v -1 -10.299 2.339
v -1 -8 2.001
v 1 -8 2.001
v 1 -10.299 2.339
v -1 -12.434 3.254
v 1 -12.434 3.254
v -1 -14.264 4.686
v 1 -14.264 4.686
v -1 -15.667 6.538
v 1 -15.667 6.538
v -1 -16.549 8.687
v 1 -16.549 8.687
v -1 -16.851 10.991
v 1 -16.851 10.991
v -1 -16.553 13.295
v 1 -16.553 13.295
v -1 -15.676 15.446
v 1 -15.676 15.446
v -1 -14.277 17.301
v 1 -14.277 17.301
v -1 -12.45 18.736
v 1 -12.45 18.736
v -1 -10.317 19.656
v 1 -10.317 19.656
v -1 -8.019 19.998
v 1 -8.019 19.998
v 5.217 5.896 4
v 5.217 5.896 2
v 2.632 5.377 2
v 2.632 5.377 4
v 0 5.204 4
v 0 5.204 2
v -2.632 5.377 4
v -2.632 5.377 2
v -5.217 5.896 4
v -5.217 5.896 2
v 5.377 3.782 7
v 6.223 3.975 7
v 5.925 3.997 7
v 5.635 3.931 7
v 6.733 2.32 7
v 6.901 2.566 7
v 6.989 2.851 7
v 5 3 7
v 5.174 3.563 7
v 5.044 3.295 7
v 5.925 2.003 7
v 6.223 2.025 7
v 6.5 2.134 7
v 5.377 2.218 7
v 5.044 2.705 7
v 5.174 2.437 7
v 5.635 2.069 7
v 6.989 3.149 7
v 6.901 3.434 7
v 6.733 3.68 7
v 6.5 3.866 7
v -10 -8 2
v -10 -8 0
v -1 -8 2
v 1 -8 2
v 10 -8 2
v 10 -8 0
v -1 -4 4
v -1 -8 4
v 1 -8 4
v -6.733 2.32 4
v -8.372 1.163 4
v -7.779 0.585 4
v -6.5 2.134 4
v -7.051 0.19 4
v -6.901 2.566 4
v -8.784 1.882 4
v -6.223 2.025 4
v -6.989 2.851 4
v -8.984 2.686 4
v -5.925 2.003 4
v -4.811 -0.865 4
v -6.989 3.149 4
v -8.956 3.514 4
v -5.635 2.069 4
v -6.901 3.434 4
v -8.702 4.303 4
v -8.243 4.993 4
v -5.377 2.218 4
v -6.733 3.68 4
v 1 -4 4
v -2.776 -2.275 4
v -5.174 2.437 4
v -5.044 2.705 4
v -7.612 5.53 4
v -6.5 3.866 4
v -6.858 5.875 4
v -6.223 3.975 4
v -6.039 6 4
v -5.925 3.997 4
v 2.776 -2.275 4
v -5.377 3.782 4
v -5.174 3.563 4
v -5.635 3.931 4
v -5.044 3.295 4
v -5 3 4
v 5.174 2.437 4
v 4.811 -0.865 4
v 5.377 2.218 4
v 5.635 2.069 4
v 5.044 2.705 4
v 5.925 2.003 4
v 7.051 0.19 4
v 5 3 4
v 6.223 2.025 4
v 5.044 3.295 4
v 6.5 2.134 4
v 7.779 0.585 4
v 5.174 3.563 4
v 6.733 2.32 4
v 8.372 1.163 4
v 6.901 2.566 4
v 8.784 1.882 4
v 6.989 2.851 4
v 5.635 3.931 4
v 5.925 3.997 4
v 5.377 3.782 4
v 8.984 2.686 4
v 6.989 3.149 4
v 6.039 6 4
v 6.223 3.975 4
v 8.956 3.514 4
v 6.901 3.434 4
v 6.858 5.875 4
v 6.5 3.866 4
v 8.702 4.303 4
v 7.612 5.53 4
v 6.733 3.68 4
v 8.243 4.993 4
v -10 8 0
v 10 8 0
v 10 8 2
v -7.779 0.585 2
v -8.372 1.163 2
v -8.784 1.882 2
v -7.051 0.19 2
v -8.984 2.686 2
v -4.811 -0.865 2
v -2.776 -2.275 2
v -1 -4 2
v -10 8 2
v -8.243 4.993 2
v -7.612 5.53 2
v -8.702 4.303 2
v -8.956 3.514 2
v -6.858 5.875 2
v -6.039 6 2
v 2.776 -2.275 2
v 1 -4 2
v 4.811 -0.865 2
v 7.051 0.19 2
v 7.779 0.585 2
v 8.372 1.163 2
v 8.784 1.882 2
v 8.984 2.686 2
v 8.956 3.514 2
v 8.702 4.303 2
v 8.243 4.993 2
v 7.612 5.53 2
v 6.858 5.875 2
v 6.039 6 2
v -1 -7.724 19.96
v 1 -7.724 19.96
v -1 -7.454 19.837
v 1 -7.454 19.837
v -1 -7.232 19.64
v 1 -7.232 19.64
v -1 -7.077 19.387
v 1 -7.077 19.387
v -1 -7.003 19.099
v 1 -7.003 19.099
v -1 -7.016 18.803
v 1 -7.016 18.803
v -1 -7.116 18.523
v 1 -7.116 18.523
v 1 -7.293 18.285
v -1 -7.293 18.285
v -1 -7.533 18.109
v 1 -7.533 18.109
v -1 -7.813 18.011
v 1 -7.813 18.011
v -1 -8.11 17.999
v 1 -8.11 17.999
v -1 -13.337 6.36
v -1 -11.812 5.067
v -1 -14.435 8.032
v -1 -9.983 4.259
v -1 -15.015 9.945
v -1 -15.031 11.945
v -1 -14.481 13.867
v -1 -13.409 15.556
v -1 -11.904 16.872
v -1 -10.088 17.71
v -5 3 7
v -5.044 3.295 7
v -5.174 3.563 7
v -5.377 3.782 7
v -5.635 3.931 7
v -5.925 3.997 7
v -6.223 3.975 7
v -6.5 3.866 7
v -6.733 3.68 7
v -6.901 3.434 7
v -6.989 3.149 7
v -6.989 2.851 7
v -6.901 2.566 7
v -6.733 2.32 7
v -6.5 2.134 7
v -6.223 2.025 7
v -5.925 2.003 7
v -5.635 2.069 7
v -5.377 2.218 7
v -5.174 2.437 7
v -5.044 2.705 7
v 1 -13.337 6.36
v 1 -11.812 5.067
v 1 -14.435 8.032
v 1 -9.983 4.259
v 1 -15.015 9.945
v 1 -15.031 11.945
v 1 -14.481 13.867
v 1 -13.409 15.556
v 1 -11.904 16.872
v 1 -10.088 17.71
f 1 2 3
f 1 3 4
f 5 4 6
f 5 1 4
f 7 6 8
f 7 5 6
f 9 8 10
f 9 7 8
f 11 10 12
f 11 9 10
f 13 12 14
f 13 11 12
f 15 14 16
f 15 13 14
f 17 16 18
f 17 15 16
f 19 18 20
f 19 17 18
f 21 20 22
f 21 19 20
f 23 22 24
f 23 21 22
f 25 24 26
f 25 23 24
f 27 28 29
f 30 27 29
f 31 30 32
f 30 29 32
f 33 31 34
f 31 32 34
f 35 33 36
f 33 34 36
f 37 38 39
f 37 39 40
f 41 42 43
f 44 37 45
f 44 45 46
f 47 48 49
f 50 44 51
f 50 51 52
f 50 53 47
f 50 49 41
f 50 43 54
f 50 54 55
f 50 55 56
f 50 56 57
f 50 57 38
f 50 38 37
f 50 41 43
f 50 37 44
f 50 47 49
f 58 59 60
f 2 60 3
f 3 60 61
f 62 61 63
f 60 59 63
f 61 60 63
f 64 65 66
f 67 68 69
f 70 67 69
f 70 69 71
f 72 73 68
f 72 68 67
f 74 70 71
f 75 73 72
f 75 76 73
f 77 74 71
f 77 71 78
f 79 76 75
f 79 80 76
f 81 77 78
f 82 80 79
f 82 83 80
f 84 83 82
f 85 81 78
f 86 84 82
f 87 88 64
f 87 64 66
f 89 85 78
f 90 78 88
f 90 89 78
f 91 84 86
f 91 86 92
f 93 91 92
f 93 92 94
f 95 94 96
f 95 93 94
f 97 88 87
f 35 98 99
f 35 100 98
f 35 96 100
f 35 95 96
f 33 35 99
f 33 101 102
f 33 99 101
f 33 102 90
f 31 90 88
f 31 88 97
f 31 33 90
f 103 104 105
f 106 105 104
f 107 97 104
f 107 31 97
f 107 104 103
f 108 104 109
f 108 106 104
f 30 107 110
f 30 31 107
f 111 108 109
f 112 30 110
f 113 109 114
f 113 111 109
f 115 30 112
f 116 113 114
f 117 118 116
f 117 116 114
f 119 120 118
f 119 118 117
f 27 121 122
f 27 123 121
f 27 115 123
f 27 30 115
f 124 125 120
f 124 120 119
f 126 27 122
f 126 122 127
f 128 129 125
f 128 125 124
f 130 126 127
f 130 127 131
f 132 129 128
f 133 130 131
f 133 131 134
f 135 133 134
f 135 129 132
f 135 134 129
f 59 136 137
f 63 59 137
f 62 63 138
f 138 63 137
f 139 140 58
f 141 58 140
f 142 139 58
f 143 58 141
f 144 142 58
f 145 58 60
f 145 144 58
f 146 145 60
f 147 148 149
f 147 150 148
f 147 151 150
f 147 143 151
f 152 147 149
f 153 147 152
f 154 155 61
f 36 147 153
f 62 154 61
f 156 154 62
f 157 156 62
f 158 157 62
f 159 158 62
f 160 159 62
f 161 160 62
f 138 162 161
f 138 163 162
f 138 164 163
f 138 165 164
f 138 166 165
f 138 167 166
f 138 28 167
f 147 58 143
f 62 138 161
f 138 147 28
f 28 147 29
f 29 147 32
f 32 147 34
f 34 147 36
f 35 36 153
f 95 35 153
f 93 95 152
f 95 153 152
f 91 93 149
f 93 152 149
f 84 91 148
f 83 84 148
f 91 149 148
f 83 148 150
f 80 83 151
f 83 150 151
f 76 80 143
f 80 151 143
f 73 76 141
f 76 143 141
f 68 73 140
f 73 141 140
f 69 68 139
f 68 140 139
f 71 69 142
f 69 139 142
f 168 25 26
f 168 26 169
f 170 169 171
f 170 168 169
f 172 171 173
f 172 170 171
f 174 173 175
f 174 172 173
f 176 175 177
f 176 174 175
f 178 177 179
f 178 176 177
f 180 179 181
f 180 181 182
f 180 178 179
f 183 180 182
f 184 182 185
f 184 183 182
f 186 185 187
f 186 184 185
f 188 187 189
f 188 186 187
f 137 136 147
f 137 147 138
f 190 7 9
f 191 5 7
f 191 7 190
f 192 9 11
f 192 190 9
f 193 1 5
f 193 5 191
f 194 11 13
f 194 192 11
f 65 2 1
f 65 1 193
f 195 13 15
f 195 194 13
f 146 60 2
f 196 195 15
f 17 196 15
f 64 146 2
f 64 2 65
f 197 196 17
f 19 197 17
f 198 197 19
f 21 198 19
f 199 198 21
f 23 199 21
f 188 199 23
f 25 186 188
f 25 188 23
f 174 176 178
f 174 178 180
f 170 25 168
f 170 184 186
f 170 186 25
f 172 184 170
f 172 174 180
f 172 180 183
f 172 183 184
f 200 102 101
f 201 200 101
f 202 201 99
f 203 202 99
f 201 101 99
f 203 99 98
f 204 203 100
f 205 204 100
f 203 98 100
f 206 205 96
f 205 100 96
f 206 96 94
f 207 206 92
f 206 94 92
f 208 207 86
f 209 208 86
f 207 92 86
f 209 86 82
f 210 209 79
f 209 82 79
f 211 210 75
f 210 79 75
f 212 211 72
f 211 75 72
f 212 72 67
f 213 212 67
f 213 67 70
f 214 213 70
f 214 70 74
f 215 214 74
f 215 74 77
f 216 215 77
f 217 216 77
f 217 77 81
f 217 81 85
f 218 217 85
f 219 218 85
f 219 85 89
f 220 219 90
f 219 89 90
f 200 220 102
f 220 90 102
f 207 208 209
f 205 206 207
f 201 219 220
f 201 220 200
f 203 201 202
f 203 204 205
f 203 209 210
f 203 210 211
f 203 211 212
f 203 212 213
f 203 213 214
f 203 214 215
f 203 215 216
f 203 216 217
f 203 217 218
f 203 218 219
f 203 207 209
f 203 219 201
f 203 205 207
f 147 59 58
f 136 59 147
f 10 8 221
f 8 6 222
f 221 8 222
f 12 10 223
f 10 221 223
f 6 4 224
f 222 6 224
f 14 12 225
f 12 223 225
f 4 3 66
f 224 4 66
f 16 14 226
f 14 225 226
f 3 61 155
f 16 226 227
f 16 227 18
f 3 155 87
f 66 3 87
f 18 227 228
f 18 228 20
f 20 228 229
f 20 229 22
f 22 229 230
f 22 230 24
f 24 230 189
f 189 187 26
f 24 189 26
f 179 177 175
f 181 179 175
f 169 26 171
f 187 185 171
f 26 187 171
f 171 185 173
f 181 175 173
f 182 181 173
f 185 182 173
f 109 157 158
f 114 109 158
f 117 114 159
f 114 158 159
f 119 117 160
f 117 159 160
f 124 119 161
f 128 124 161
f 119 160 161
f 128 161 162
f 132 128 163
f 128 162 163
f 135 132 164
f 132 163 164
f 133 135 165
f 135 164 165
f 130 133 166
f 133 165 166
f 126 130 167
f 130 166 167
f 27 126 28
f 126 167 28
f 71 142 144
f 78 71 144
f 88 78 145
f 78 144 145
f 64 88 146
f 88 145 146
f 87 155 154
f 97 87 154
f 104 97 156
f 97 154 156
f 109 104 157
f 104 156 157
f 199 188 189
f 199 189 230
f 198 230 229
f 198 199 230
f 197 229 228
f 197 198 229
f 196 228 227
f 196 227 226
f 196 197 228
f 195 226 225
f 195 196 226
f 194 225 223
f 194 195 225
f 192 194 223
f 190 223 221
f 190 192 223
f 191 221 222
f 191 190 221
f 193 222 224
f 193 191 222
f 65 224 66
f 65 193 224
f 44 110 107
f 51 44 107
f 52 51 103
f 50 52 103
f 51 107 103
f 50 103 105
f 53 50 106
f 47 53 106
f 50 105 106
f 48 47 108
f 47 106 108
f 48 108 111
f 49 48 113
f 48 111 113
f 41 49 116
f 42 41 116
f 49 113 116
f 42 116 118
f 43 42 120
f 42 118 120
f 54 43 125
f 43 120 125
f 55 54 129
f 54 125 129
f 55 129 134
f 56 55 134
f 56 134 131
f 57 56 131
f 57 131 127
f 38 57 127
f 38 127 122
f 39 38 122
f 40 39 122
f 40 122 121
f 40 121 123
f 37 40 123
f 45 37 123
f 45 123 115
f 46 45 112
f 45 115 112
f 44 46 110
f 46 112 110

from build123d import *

# Parameters (mm, degrees)
CROQUIS2_W                   = 20
CROQUIS2_H                   = 16
SALIENTE_EXTRUIR1_DEPTH      = 2
SALIENTE_EXTRUIR2_DEPTH      = 2
CROQUIS4_R                   = 1
SALIENTE_EXTRUIR3_DEPTH      = 3
SALIENTE_EXTRUIR4_DEPTH      = 1
SALIENTE_EXTRUIR4_DEPTH_BACK = 1


with BuildPart() as part:
    # Croquis2 → Saliente-Extruir1 (new body)
    with BuildSketch(Plane.XY):
        Rectangle(CROQUIS2_W, CROQUIS2_H)
    extrude(amount=SALIENTE_EXTRUIR1_DEPTH)

    # Croquis3 → Saliente-Extruir2 (add)
    with BuildSketch(Plane.XY.offset(2)):
        with BuildLine():
            Line((1, -8), (1, -4))
            ThreePointArc((1, -4), (3.764366067, -1.528144202), (7.050666594, 0.190000052))
            ThreePointArc((7.050666594, 0.190000052), (8.85620748, 3.917648534), (5.217391304, 5.896122171))
            ThreePointArc((5.217391304, 5.896122171), (0, 5.203603311), (-5.217391304, 5.896122171))
            ThreePointArc((-5.217391304, 5.896122171), (-8.85620748, 3.917648534), (-7.050666594, 0.190000052))
            ThreePointArc((-7.050666594, 0.190000052), (-3.764366067, -1.528144202), (-1, -4))
            Line((-1, -4), (-1, -8))
            Line((-1, -8), (1, -8))
        make_face()
    extrude(amount=SALIENTE_EXTRUIR2_DEPTH)

    # Croquis4 → Saliente-Extruir3 (add)
    with BuildSketch(Plane.XY.offset(4)):
        with Locations((-6, 3)):
            Circle(CROQUIS4_R)
        with Locations(Location((6, 3, 0), (0, 0, 180))):
            Circle(CROQUIS4_R)
    extrude(amount=SALIENTE_EXTRUIR3_DEPTH)

    # Croquis5 → Saliente-Extruir4 (add, two sides: drawn at the far end of the back side and taken through both)
    with BuildSketch(Plane(origin=(0, 0, 0), x_dir=(0, 0, -1), z_dir=(1, 0, 0)).offset(-SALIENTE_EXTRUIR4_DEPTH_BACK)):
        with BuildLine():
            Line((-4, -8), (-2.00123418, -8))
            ThreePointArc((-2.00123418, -8), (-10.990655722, -16.850952462), (-19.998436931, -8.018685662))
            ThreePointArc((-19.998436931, -8.018685662), (-18.950438256, -6.998395625), (-17.99933798, -8.109566741))
            ThreePointArc((-17.99933798, -8.109566741), (-10.94456846, -15.094975828), (-4, -8))
        make_face()
    extrude(amount=SALIENTE_EXTRUIR4_DEPTH + SALIENTE_EXTRUIR4_DEPTH_BACK)


solid = part.part
